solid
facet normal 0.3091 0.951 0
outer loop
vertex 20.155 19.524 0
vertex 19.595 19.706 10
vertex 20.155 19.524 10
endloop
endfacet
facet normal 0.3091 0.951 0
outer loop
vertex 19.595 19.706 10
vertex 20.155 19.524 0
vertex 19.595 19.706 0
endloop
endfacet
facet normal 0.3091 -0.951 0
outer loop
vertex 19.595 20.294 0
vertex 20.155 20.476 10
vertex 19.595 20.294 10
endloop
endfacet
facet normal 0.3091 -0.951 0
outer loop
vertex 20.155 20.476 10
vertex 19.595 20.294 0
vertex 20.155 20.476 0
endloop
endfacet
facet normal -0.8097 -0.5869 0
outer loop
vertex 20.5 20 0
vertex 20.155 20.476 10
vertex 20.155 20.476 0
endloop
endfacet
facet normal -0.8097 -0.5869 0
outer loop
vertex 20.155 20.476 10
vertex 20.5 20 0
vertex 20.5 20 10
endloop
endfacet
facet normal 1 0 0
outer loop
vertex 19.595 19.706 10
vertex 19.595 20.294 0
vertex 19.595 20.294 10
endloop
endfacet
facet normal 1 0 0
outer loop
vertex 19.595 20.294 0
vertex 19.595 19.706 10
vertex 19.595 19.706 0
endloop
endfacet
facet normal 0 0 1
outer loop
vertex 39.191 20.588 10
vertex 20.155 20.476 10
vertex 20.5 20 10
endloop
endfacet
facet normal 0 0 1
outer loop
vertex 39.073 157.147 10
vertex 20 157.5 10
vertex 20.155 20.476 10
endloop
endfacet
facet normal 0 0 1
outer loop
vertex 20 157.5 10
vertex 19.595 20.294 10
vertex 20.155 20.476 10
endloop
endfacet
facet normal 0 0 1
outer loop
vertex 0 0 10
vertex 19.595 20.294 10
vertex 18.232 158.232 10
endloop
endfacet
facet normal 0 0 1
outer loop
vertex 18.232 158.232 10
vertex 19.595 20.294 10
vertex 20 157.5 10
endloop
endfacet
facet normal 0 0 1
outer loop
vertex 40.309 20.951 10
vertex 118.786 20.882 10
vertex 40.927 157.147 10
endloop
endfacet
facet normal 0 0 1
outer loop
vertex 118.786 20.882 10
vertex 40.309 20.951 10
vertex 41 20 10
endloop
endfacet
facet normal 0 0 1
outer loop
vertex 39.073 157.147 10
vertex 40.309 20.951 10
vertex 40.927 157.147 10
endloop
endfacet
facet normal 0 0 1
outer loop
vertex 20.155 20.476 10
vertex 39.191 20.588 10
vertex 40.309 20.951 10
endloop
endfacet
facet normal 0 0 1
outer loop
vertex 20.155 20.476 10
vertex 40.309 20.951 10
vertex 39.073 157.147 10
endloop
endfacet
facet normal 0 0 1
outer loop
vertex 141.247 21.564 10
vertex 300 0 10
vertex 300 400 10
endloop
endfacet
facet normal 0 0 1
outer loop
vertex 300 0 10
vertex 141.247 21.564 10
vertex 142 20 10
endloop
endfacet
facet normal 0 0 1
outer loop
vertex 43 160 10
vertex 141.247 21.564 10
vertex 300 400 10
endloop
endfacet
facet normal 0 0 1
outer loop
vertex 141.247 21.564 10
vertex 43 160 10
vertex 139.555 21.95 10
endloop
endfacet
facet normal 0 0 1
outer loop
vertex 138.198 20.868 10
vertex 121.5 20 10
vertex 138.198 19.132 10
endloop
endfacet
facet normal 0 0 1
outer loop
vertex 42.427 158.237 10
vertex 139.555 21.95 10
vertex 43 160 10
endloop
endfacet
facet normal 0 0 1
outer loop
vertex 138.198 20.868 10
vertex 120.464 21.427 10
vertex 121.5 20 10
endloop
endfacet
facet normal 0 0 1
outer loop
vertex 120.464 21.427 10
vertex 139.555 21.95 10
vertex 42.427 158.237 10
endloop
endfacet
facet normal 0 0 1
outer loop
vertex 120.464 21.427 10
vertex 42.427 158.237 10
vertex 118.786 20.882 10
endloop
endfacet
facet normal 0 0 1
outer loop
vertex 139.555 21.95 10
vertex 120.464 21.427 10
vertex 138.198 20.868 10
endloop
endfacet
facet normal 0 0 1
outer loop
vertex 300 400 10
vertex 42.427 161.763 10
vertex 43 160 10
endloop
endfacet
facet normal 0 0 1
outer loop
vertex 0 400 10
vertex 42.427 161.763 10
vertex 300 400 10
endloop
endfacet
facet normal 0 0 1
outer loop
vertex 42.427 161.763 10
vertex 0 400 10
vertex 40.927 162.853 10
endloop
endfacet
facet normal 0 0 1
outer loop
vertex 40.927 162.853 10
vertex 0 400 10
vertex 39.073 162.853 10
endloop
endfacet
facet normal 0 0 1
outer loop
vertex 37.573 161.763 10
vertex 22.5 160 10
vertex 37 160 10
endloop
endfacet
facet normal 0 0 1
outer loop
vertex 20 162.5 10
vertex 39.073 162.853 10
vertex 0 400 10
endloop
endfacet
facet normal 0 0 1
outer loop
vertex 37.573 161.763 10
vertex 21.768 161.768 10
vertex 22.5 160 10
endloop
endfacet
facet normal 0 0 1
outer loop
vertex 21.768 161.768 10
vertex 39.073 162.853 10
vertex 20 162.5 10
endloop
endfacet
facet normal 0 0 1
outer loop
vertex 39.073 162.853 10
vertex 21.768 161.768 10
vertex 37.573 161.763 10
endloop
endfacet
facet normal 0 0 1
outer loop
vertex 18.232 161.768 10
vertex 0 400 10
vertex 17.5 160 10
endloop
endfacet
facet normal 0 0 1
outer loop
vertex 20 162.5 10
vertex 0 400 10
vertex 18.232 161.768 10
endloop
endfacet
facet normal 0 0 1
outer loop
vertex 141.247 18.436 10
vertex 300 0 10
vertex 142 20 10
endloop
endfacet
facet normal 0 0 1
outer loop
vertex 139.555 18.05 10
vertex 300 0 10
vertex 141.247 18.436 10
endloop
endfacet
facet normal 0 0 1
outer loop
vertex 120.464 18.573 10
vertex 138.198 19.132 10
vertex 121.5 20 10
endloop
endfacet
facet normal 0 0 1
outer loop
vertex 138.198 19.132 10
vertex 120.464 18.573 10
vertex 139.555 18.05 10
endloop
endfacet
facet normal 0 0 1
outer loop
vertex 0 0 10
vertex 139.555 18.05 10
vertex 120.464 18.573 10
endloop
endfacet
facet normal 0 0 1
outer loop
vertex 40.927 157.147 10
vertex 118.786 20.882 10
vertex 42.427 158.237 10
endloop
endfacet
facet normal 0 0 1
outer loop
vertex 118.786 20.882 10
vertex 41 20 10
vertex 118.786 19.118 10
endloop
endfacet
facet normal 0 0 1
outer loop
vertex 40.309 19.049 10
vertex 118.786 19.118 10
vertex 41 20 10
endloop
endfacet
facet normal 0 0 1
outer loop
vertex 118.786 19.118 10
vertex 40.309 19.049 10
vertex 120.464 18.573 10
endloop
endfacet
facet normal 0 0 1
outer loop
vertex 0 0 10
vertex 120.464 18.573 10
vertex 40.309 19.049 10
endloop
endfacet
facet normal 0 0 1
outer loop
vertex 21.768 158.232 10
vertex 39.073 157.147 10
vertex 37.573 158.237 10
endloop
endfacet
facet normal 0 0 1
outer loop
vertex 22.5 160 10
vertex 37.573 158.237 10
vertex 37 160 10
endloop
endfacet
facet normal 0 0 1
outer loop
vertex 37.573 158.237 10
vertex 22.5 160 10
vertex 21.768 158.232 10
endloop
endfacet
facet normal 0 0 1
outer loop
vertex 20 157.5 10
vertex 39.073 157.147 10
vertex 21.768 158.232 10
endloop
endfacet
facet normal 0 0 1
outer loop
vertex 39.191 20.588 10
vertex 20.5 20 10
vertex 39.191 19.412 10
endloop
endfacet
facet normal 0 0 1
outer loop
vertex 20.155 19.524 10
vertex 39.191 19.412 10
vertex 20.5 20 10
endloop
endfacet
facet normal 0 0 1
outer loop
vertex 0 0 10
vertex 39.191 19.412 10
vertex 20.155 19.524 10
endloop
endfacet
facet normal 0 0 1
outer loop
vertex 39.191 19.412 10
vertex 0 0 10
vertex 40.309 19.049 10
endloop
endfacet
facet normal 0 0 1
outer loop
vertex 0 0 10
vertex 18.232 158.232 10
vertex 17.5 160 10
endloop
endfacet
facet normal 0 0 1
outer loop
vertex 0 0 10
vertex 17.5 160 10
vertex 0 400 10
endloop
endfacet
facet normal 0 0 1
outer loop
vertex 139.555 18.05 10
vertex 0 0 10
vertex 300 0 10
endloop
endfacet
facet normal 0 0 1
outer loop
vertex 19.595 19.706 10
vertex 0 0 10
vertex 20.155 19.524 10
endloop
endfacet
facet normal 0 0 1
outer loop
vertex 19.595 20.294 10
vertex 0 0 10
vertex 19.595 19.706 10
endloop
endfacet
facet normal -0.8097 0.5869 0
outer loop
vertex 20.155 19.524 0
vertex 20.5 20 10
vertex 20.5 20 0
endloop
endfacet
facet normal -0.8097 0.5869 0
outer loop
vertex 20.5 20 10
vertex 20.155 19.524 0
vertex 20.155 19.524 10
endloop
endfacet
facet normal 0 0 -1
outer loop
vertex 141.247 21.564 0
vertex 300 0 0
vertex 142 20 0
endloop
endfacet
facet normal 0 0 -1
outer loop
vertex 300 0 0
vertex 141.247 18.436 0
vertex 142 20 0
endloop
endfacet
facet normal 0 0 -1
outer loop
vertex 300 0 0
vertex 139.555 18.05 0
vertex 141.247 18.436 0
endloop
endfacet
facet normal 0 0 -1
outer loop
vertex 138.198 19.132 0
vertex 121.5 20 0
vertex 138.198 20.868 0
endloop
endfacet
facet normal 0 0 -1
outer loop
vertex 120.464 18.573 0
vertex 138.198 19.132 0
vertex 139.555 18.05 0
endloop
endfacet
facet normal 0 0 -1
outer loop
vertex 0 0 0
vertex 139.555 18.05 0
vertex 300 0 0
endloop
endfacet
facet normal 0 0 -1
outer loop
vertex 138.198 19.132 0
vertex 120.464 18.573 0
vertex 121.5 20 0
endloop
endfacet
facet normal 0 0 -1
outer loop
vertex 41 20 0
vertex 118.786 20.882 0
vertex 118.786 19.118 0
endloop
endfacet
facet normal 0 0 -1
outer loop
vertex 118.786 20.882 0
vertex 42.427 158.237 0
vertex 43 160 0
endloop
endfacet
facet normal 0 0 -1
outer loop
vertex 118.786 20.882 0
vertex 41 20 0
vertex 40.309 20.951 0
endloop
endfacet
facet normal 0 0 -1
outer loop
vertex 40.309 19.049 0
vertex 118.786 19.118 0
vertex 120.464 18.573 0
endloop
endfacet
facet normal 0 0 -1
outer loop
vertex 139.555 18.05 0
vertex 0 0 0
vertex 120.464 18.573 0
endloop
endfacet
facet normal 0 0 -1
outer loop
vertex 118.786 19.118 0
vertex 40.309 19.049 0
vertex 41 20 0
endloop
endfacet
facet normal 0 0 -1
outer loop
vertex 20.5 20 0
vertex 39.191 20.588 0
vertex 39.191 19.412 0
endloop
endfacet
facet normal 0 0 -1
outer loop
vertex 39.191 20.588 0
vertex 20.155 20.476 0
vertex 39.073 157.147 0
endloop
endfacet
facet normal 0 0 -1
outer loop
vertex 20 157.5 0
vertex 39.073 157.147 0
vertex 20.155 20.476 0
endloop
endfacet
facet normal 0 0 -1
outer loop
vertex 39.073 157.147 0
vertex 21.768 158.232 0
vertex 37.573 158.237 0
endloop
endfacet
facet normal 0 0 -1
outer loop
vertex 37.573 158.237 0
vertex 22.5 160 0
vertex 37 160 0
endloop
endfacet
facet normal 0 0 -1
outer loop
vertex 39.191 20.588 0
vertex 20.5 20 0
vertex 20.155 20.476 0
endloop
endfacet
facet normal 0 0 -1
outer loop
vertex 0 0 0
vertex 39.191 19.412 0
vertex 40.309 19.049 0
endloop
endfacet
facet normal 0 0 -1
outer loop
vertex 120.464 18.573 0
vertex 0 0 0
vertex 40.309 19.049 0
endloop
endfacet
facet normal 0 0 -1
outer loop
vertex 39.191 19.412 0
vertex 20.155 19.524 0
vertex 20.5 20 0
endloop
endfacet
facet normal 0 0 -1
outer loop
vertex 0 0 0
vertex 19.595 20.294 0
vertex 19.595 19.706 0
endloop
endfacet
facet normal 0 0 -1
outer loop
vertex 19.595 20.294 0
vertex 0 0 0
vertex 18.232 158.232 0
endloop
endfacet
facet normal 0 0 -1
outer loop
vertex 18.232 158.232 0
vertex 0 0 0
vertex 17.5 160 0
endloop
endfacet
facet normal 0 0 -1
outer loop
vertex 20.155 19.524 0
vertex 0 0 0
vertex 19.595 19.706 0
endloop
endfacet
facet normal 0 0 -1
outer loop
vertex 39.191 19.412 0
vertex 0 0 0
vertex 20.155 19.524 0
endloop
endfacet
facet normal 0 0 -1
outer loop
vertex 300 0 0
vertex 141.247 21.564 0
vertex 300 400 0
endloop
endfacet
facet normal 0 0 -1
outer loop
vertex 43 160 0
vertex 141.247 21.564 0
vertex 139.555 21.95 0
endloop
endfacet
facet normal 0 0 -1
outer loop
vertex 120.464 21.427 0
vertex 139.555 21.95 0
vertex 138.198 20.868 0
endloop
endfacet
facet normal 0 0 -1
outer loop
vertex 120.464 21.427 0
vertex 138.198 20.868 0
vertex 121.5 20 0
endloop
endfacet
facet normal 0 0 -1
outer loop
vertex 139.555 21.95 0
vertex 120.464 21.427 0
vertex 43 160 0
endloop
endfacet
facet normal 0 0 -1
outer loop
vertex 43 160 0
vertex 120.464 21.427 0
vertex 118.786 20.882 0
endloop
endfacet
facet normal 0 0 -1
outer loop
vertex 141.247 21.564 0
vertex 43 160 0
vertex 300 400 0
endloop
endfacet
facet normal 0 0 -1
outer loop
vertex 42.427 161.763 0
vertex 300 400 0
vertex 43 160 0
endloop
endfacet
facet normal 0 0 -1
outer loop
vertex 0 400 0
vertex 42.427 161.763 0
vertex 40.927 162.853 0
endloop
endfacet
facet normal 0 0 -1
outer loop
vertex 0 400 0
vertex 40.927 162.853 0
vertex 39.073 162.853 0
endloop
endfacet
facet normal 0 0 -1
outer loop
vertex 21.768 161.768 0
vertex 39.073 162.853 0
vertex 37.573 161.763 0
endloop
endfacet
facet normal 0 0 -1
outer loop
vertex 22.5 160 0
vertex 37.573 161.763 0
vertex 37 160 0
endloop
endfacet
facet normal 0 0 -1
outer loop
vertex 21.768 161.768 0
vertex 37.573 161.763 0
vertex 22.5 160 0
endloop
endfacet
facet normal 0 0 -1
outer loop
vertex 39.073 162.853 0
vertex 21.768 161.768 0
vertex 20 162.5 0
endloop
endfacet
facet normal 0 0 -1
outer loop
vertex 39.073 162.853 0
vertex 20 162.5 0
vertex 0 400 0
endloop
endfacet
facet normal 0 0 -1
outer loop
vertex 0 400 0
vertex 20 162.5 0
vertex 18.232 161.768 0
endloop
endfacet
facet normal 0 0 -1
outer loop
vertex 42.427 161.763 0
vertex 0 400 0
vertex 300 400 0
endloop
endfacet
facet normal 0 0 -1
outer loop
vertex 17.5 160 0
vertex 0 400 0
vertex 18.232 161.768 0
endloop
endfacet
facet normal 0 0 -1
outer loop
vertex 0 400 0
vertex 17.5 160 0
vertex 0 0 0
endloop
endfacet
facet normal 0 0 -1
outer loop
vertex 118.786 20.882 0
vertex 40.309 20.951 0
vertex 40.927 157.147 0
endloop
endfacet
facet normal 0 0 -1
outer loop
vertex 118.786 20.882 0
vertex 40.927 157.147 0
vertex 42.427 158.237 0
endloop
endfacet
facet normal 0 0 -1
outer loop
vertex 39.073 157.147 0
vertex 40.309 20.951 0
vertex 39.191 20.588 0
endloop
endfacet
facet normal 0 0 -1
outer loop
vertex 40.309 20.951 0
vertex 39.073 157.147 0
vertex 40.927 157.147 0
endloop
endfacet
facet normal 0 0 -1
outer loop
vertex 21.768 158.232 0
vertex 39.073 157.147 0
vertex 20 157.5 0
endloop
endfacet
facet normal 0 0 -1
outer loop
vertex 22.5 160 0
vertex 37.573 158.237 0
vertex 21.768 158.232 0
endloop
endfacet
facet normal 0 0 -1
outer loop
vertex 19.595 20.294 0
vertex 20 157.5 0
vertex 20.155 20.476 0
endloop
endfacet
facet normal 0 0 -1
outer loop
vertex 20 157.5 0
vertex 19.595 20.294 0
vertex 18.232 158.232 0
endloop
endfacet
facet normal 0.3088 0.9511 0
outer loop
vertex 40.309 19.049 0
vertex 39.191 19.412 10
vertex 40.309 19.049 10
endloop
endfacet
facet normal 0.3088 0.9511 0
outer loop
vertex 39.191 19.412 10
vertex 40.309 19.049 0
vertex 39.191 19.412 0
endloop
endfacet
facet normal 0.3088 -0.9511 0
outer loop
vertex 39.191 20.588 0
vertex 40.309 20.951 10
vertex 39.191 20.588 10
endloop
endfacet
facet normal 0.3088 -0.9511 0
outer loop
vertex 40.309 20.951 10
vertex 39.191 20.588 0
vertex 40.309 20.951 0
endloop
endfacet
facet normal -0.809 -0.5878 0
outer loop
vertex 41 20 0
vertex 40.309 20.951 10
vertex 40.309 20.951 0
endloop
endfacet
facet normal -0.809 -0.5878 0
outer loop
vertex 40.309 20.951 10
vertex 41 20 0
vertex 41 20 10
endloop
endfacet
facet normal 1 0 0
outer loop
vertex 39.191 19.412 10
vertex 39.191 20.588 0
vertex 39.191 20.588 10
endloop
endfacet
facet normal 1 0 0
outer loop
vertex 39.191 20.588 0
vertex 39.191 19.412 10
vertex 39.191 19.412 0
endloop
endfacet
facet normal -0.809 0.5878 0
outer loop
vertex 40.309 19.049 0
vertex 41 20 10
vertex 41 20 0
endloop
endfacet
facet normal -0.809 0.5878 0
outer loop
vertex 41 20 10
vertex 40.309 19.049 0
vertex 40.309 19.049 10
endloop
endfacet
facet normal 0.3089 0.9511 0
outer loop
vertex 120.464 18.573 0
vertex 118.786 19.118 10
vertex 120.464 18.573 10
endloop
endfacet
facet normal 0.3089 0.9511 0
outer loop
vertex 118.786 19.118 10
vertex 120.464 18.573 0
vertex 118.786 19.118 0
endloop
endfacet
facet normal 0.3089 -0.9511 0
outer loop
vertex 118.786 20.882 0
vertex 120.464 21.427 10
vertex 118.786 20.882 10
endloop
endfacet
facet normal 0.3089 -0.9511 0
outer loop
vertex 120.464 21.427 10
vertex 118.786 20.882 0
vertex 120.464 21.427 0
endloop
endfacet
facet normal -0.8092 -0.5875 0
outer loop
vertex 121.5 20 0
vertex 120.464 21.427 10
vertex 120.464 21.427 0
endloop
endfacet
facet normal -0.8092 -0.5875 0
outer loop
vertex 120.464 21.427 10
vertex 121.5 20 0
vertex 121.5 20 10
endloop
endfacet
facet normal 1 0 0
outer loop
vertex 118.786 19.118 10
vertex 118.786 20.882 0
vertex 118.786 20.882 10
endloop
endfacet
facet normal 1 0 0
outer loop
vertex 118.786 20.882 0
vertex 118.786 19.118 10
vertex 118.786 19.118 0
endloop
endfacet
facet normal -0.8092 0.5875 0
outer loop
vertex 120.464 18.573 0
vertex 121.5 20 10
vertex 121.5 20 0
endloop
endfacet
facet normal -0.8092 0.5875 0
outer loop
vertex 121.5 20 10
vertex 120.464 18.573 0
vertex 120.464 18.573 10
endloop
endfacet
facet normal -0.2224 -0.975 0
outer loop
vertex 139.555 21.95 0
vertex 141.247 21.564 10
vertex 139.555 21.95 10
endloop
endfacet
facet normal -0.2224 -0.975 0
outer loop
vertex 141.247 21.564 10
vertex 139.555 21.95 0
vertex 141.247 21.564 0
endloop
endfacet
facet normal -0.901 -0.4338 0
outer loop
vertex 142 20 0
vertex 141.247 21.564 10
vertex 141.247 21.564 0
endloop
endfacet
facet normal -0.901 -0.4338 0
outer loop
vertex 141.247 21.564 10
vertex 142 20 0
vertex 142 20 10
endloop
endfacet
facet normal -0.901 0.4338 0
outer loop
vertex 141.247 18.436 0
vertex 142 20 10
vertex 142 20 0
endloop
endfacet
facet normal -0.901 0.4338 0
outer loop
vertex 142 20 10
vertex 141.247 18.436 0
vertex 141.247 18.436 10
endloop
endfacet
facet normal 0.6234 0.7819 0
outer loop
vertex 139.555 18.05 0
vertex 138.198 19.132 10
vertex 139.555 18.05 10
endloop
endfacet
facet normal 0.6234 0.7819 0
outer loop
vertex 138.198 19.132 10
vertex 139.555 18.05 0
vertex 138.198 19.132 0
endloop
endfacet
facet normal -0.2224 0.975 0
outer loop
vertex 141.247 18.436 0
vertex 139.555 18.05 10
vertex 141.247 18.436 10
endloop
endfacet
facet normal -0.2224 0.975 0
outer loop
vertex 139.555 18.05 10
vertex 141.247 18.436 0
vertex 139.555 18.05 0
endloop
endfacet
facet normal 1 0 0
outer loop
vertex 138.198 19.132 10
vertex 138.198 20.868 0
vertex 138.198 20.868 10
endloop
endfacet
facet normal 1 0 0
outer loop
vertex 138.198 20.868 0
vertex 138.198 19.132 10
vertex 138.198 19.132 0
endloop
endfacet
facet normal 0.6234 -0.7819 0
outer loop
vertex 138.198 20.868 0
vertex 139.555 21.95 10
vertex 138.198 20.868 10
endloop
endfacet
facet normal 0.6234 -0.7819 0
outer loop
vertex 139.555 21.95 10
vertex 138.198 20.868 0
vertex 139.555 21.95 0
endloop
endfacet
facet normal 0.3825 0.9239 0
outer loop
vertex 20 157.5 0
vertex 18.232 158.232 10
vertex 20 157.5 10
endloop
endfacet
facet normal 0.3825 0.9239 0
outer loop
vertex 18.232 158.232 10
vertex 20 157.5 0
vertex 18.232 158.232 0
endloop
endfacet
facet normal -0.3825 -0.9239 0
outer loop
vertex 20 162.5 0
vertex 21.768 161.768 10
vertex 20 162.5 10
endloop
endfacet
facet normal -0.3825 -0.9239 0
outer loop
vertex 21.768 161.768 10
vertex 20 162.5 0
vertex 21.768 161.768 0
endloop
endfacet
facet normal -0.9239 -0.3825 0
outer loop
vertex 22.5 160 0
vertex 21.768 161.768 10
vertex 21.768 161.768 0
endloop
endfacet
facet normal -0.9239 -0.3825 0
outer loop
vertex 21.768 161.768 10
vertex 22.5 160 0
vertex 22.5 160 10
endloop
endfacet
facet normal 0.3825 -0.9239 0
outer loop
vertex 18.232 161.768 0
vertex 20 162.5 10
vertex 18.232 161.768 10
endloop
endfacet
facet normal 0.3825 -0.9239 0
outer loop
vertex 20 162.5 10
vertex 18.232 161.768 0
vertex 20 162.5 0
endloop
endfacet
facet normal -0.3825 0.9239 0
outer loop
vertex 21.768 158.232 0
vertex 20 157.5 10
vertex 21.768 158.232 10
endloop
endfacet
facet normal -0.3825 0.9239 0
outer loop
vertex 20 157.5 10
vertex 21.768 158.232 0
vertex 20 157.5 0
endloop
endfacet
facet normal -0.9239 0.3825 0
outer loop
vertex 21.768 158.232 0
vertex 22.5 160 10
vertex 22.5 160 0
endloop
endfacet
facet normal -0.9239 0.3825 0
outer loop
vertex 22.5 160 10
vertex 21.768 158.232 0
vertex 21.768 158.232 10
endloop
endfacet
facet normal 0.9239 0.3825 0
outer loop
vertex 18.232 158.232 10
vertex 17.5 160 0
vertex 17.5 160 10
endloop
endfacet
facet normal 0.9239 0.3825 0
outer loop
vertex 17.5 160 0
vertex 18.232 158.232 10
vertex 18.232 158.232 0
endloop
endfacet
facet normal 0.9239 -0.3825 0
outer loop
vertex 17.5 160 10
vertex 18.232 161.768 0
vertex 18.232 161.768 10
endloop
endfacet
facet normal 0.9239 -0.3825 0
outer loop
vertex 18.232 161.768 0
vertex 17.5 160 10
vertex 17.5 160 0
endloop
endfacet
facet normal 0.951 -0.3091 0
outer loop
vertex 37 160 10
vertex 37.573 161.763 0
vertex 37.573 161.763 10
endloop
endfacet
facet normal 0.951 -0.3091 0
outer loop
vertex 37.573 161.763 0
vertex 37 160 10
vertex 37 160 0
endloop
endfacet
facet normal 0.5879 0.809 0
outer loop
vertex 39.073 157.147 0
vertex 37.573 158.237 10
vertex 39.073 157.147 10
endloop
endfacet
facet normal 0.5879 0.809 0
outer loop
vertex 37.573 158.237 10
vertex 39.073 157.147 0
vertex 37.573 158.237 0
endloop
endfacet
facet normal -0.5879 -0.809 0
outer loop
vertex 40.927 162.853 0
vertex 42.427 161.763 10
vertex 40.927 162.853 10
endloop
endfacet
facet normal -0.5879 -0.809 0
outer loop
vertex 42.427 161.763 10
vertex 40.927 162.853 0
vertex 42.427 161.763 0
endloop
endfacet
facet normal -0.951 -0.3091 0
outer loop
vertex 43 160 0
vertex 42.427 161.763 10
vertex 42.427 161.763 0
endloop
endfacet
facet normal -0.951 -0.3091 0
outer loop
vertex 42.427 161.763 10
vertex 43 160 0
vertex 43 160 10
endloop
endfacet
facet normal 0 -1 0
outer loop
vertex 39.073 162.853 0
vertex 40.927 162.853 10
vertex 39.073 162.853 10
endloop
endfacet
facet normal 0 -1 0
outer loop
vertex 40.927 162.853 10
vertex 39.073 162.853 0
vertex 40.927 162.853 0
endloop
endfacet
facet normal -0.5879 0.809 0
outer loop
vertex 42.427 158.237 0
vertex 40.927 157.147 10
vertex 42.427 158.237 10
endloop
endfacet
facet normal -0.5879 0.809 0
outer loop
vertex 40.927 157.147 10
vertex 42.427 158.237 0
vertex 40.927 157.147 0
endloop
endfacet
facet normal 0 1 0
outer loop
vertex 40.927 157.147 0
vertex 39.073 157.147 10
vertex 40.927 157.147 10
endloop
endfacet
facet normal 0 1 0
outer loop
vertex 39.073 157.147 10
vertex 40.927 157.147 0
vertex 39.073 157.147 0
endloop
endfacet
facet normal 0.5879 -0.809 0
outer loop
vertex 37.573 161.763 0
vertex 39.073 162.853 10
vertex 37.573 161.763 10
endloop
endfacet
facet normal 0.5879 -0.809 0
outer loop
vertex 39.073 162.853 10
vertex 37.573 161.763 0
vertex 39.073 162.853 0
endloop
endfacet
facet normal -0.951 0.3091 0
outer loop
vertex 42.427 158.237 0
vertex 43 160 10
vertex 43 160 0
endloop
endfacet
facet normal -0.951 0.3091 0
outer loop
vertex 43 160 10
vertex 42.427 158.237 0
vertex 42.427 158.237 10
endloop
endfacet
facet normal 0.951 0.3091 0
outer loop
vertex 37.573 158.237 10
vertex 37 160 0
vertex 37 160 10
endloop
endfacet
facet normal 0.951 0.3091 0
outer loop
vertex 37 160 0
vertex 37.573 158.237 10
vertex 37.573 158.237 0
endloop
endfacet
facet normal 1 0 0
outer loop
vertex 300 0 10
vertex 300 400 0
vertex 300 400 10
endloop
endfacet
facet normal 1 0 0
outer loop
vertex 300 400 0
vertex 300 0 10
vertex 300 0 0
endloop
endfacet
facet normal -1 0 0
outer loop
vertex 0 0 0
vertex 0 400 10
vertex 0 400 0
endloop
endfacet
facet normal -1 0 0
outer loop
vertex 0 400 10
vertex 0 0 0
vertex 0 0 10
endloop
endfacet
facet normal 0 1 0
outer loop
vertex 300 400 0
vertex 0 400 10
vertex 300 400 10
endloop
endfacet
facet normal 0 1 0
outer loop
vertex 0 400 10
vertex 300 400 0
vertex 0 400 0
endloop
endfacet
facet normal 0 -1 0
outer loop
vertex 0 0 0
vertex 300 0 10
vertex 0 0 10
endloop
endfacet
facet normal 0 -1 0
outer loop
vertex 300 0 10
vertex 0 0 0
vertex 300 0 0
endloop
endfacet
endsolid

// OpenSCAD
use <MCAD/units.scad>;

module plate_with_holes(width,
                        depth,
                        height,
                        holes) {
    difference() {
        cube([width, depth, height]);
        for(p = holes) {
            translate([p.x, p.y, 0])
                cylinder(d=p.z, h=height);
        };
    };
};

// example
holes = [ [20,20,1],
          [40,20,2],
          [120,20,3],
          [140,20,4],
          [20,160,5],
          [40,160,6] ];
plate_with_holes(300, 400, 10, holes);
